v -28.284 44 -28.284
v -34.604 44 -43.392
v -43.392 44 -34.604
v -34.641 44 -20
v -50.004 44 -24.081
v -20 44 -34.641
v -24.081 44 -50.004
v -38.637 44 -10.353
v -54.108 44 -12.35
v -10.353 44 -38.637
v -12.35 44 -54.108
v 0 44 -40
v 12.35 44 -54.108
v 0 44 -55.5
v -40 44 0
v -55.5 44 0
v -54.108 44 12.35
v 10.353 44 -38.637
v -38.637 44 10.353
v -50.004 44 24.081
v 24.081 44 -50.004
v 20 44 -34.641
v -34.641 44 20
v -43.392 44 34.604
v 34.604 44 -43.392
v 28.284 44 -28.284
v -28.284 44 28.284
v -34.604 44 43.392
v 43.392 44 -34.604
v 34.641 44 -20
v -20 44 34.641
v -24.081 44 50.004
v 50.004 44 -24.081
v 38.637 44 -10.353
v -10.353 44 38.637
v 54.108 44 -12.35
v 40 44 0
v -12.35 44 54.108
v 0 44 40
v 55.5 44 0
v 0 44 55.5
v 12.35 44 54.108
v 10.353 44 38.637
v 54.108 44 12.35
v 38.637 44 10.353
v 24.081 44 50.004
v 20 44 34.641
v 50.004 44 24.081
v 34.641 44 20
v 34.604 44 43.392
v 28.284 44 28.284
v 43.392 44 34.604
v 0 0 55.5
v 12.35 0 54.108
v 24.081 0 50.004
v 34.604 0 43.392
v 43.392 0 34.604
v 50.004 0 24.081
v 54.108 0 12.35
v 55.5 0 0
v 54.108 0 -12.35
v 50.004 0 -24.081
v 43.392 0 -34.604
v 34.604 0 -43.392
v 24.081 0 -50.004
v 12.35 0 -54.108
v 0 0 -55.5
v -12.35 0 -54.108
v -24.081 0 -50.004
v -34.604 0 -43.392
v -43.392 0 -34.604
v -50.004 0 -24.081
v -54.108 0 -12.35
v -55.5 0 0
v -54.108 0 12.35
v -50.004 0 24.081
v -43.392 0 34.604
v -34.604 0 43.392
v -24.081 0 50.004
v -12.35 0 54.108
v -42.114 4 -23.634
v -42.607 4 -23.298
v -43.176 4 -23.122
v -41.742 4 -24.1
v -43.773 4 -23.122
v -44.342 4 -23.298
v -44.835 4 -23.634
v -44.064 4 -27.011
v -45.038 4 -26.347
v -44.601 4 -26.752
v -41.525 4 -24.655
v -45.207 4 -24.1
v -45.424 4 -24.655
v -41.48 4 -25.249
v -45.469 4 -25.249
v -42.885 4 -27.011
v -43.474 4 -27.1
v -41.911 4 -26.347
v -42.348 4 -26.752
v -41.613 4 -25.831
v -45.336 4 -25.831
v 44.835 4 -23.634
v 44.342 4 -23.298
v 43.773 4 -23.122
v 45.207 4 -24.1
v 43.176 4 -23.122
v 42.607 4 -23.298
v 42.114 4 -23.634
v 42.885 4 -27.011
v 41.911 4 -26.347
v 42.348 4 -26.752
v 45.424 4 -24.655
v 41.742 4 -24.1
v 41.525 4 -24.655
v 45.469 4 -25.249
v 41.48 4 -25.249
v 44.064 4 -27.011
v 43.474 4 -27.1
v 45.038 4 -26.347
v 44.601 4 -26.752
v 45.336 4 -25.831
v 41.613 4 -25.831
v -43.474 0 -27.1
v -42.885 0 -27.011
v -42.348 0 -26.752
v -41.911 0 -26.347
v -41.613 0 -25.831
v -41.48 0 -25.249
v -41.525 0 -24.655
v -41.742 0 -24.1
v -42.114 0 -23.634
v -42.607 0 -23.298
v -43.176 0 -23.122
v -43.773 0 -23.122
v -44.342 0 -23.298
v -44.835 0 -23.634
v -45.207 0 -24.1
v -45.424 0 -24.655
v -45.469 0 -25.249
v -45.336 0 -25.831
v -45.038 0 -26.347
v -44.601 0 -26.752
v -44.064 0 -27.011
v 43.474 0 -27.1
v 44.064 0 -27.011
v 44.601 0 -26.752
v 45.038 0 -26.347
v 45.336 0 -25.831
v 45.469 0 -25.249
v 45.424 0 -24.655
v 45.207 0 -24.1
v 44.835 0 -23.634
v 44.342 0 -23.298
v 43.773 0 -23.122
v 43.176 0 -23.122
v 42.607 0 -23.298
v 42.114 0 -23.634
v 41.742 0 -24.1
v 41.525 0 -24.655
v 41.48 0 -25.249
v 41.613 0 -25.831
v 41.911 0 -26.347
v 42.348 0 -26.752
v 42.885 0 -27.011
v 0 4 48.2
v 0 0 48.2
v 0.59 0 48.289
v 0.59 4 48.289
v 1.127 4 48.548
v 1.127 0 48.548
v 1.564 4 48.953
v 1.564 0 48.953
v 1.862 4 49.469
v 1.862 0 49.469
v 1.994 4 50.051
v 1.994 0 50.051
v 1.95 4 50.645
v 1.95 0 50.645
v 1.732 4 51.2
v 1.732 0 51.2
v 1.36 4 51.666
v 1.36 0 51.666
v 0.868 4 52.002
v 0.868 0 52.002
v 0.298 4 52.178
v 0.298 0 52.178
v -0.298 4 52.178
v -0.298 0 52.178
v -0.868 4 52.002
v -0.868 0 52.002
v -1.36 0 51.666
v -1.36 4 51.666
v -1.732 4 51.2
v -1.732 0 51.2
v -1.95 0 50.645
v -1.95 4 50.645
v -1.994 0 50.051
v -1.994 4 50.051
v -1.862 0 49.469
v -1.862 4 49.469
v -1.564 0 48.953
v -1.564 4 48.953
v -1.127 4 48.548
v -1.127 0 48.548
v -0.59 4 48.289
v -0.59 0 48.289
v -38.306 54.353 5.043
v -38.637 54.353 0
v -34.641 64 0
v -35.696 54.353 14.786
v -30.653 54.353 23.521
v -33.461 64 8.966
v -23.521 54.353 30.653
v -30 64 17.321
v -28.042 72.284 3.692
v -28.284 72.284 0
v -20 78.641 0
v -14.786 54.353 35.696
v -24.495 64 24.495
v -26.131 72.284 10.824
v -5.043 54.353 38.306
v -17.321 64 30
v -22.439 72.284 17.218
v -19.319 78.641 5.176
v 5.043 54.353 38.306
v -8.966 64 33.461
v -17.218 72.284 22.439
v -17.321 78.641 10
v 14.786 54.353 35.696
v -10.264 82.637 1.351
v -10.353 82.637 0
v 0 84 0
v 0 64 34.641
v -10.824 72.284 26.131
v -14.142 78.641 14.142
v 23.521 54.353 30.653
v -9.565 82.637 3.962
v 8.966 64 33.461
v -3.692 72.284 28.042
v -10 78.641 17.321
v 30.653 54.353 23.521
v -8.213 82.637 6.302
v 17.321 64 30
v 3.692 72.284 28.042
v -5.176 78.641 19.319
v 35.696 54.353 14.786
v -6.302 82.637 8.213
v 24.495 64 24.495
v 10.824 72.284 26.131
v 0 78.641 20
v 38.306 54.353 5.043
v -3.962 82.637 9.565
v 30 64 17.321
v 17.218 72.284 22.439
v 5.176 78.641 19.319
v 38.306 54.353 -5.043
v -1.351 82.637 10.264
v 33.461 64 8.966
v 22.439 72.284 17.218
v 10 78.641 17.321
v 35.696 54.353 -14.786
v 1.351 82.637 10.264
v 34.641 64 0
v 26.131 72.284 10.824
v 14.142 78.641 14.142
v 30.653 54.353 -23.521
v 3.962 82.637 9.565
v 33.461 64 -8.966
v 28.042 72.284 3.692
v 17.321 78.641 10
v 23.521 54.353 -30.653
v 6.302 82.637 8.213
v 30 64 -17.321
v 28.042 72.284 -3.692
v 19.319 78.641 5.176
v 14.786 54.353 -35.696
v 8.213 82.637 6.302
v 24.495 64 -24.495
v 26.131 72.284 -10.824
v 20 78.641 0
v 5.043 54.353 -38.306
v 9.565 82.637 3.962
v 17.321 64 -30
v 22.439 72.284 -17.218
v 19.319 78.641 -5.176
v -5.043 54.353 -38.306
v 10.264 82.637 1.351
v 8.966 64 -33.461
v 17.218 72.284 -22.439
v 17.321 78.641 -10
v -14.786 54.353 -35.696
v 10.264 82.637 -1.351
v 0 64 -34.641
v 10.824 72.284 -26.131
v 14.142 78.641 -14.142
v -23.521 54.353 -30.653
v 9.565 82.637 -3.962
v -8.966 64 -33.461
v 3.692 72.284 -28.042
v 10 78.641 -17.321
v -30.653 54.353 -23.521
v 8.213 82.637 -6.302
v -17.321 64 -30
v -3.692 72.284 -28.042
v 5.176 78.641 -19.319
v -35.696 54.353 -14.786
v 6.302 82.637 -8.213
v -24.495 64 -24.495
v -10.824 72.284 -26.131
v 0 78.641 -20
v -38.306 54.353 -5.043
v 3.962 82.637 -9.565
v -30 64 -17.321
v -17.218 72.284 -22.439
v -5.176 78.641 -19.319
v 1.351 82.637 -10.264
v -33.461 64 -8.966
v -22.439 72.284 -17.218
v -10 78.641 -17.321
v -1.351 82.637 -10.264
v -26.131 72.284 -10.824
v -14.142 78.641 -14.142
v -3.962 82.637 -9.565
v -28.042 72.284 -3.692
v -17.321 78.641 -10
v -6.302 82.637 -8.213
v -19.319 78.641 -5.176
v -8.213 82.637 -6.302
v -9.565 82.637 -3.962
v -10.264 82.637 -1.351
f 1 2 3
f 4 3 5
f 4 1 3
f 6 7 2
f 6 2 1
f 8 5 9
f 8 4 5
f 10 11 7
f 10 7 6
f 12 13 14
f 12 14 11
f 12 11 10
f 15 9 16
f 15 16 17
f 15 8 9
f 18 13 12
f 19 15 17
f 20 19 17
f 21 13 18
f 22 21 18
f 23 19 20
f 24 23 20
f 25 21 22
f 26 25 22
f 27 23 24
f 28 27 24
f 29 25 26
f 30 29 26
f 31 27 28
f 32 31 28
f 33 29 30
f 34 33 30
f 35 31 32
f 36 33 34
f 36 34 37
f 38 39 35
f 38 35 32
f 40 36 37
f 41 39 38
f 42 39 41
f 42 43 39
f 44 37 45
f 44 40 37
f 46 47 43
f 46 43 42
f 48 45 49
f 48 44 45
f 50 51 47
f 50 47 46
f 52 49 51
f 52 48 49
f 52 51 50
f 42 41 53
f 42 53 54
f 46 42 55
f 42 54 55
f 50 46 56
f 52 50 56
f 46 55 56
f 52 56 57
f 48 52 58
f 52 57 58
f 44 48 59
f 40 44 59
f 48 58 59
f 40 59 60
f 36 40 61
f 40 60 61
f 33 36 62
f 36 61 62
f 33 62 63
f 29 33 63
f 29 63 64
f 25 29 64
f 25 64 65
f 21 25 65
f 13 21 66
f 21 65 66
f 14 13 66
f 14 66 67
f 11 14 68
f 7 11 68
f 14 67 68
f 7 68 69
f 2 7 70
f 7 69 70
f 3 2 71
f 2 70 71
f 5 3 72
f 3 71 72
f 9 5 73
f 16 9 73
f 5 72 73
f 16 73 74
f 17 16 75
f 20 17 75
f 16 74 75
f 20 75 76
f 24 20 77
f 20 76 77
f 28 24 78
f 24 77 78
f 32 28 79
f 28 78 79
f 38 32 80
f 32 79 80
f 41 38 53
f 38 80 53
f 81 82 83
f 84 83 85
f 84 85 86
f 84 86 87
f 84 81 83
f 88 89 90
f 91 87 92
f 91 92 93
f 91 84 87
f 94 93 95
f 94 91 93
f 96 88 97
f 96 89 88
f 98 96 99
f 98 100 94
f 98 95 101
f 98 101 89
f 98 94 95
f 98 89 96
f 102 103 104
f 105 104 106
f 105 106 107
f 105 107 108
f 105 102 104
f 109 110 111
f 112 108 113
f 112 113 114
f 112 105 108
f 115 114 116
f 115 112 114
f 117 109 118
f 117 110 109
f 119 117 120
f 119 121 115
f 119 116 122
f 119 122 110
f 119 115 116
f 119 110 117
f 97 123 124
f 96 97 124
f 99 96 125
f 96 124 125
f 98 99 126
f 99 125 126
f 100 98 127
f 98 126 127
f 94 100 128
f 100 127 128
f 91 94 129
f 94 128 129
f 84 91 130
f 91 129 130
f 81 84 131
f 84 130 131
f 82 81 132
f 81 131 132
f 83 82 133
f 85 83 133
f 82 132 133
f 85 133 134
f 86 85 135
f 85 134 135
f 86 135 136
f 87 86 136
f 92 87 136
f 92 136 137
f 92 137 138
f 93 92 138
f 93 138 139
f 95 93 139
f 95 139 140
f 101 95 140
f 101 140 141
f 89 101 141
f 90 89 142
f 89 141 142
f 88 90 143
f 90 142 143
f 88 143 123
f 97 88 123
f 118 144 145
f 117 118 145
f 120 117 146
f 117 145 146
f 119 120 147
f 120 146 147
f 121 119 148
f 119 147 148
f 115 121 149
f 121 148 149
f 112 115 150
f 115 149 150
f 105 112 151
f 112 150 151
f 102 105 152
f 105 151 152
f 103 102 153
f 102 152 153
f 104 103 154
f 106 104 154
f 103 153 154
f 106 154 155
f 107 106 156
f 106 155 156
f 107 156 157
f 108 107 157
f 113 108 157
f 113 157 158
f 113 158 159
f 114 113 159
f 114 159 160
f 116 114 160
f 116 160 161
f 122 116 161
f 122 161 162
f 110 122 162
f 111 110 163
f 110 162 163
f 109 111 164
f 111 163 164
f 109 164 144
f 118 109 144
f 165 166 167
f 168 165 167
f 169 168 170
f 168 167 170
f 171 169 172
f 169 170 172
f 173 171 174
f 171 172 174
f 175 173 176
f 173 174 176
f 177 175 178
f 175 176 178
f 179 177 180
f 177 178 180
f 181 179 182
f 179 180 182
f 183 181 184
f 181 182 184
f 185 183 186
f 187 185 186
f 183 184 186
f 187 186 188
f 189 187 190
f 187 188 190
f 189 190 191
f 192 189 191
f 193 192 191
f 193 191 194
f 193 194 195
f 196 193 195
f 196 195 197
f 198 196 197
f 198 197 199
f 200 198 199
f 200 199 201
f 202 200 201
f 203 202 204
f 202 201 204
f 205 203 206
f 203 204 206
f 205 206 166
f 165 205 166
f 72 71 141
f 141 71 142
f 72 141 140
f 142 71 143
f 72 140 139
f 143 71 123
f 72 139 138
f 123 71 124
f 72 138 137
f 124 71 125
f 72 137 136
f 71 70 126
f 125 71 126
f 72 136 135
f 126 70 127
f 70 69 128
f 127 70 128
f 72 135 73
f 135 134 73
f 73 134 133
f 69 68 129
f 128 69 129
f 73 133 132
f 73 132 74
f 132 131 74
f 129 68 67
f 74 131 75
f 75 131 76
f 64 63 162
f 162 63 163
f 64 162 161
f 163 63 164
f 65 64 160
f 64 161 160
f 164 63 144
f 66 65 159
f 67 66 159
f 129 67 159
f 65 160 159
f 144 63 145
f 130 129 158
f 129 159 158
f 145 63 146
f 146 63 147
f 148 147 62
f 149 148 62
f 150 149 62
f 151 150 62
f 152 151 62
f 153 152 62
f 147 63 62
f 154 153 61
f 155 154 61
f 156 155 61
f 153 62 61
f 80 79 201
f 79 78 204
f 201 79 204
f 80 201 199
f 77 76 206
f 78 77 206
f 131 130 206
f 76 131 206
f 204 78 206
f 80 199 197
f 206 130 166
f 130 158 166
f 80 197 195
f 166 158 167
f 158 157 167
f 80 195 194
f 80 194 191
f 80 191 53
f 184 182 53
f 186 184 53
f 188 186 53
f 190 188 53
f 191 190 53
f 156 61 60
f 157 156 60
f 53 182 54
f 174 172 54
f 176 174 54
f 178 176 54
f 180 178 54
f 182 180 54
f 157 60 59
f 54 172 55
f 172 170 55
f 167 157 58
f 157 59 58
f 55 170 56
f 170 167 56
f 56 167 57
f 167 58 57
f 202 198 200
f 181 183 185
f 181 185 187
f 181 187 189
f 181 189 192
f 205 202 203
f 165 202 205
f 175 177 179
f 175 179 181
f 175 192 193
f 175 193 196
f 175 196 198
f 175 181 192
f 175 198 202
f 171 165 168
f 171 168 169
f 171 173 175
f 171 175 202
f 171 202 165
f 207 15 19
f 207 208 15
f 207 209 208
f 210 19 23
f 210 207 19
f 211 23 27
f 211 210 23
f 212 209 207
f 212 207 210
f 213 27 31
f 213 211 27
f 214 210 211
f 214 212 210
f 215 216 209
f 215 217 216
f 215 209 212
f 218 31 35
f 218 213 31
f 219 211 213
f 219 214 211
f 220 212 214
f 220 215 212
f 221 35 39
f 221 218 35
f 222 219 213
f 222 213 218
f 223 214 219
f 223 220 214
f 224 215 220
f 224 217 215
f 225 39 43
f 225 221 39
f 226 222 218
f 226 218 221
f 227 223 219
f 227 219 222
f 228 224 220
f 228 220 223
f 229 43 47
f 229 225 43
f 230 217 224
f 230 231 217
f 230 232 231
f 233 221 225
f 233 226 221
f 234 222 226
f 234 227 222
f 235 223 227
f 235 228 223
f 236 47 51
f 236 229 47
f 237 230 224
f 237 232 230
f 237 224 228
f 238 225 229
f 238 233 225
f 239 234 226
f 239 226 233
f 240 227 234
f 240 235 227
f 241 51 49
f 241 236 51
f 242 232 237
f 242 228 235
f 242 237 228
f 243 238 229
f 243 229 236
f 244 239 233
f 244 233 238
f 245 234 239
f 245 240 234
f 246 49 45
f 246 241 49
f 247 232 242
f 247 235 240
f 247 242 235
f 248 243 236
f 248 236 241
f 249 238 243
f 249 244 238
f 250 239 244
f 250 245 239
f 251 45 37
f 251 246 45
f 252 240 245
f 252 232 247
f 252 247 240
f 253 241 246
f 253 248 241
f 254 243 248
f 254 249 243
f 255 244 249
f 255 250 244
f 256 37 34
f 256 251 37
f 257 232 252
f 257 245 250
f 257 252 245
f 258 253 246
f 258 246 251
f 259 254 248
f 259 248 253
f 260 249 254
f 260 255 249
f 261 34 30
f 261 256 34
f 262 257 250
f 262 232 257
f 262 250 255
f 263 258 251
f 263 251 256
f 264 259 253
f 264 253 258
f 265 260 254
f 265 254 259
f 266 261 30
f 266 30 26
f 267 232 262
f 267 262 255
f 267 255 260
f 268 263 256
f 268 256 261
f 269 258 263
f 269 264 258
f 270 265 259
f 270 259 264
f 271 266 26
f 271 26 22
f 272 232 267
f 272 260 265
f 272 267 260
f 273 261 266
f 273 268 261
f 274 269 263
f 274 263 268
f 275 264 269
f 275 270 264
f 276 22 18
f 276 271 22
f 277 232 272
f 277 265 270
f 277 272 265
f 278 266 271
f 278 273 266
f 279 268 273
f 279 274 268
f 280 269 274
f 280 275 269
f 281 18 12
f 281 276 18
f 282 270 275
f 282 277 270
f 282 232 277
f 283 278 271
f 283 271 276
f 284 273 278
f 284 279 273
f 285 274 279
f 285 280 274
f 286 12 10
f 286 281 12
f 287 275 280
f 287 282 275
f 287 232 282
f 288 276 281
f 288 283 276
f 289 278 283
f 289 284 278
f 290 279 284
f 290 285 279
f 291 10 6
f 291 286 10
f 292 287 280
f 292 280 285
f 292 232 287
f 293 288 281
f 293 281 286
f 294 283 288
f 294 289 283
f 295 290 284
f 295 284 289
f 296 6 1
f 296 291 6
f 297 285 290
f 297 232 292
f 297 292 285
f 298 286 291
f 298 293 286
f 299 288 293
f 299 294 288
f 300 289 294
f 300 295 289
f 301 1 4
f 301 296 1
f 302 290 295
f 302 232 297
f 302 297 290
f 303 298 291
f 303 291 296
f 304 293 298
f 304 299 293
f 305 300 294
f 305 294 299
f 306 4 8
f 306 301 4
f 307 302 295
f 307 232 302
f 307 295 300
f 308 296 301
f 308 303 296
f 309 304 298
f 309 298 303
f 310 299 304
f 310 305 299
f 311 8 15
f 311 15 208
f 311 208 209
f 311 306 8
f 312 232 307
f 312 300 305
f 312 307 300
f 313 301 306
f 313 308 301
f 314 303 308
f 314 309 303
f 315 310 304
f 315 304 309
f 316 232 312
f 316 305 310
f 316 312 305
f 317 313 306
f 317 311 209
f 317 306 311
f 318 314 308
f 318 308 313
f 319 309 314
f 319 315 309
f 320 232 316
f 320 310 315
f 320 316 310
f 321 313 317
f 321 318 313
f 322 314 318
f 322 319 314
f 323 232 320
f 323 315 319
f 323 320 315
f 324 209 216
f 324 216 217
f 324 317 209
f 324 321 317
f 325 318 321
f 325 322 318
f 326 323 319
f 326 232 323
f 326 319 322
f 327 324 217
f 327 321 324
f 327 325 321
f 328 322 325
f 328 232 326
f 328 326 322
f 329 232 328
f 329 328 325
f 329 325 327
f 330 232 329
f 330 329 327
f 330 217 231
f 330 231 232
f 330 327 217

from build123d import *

# Parameters (mm, degrees)
SKETCH1_R           = 55.5
BOSS_EXTRUDE1_DEPTH = 44
SKETCH4_R           = 2
CUT_EXTRUDE1_DEPTH  = 4


with BuildPart() as part:
    # Sketch1 → Boss-Extrude1 (new body)
    with BuildSketch(Plane(origin=(0, 0, 0), x_dir=(1, 0, 0), z_dir=(0, 1, 0))):
        with Locations(Location((0, 0, 0), (0, 0, 270))):
            Circle(SKETCH1_R)
    extrude(amount=BOSS_EXTRUDE1_DEPTH)

    # Sketch3 → Revolve1 (revolve)
    with BuildSketch(Plane.XY):
        with BuildLine():
            Line((0, 44), (-40, 44))
            ThreePointArc((-40, 44), (-28.284271247, 72.284271247), (0, 84))
            Line((0, 84), (0, 44))
        make_face()
    revolve(axis=Axis((0, 44, 0), (0, 1, 0)))

    # Sketch4 → Cut-Extrude1 (cut)
    with BuildSketch(Plane.XZ):
        with Locations(Location((0, 50.2, 0), (0, 0, 270))):
            Circle(SKETCH4_R)
        with Locations(Location((43.47447527, -25.1, 0), (0, 0, 270))):
            Circle(SKETCH4_R)
        with Locations(Location((-43.47447527, -25.1, 0), (0, 0, 270))):
            Circle(SKETCH4_R)
    extrude(amount=-CUT_EXTRUDE1_DEPTH, mode=Mode.SUBTRACT)


solid = part.part
